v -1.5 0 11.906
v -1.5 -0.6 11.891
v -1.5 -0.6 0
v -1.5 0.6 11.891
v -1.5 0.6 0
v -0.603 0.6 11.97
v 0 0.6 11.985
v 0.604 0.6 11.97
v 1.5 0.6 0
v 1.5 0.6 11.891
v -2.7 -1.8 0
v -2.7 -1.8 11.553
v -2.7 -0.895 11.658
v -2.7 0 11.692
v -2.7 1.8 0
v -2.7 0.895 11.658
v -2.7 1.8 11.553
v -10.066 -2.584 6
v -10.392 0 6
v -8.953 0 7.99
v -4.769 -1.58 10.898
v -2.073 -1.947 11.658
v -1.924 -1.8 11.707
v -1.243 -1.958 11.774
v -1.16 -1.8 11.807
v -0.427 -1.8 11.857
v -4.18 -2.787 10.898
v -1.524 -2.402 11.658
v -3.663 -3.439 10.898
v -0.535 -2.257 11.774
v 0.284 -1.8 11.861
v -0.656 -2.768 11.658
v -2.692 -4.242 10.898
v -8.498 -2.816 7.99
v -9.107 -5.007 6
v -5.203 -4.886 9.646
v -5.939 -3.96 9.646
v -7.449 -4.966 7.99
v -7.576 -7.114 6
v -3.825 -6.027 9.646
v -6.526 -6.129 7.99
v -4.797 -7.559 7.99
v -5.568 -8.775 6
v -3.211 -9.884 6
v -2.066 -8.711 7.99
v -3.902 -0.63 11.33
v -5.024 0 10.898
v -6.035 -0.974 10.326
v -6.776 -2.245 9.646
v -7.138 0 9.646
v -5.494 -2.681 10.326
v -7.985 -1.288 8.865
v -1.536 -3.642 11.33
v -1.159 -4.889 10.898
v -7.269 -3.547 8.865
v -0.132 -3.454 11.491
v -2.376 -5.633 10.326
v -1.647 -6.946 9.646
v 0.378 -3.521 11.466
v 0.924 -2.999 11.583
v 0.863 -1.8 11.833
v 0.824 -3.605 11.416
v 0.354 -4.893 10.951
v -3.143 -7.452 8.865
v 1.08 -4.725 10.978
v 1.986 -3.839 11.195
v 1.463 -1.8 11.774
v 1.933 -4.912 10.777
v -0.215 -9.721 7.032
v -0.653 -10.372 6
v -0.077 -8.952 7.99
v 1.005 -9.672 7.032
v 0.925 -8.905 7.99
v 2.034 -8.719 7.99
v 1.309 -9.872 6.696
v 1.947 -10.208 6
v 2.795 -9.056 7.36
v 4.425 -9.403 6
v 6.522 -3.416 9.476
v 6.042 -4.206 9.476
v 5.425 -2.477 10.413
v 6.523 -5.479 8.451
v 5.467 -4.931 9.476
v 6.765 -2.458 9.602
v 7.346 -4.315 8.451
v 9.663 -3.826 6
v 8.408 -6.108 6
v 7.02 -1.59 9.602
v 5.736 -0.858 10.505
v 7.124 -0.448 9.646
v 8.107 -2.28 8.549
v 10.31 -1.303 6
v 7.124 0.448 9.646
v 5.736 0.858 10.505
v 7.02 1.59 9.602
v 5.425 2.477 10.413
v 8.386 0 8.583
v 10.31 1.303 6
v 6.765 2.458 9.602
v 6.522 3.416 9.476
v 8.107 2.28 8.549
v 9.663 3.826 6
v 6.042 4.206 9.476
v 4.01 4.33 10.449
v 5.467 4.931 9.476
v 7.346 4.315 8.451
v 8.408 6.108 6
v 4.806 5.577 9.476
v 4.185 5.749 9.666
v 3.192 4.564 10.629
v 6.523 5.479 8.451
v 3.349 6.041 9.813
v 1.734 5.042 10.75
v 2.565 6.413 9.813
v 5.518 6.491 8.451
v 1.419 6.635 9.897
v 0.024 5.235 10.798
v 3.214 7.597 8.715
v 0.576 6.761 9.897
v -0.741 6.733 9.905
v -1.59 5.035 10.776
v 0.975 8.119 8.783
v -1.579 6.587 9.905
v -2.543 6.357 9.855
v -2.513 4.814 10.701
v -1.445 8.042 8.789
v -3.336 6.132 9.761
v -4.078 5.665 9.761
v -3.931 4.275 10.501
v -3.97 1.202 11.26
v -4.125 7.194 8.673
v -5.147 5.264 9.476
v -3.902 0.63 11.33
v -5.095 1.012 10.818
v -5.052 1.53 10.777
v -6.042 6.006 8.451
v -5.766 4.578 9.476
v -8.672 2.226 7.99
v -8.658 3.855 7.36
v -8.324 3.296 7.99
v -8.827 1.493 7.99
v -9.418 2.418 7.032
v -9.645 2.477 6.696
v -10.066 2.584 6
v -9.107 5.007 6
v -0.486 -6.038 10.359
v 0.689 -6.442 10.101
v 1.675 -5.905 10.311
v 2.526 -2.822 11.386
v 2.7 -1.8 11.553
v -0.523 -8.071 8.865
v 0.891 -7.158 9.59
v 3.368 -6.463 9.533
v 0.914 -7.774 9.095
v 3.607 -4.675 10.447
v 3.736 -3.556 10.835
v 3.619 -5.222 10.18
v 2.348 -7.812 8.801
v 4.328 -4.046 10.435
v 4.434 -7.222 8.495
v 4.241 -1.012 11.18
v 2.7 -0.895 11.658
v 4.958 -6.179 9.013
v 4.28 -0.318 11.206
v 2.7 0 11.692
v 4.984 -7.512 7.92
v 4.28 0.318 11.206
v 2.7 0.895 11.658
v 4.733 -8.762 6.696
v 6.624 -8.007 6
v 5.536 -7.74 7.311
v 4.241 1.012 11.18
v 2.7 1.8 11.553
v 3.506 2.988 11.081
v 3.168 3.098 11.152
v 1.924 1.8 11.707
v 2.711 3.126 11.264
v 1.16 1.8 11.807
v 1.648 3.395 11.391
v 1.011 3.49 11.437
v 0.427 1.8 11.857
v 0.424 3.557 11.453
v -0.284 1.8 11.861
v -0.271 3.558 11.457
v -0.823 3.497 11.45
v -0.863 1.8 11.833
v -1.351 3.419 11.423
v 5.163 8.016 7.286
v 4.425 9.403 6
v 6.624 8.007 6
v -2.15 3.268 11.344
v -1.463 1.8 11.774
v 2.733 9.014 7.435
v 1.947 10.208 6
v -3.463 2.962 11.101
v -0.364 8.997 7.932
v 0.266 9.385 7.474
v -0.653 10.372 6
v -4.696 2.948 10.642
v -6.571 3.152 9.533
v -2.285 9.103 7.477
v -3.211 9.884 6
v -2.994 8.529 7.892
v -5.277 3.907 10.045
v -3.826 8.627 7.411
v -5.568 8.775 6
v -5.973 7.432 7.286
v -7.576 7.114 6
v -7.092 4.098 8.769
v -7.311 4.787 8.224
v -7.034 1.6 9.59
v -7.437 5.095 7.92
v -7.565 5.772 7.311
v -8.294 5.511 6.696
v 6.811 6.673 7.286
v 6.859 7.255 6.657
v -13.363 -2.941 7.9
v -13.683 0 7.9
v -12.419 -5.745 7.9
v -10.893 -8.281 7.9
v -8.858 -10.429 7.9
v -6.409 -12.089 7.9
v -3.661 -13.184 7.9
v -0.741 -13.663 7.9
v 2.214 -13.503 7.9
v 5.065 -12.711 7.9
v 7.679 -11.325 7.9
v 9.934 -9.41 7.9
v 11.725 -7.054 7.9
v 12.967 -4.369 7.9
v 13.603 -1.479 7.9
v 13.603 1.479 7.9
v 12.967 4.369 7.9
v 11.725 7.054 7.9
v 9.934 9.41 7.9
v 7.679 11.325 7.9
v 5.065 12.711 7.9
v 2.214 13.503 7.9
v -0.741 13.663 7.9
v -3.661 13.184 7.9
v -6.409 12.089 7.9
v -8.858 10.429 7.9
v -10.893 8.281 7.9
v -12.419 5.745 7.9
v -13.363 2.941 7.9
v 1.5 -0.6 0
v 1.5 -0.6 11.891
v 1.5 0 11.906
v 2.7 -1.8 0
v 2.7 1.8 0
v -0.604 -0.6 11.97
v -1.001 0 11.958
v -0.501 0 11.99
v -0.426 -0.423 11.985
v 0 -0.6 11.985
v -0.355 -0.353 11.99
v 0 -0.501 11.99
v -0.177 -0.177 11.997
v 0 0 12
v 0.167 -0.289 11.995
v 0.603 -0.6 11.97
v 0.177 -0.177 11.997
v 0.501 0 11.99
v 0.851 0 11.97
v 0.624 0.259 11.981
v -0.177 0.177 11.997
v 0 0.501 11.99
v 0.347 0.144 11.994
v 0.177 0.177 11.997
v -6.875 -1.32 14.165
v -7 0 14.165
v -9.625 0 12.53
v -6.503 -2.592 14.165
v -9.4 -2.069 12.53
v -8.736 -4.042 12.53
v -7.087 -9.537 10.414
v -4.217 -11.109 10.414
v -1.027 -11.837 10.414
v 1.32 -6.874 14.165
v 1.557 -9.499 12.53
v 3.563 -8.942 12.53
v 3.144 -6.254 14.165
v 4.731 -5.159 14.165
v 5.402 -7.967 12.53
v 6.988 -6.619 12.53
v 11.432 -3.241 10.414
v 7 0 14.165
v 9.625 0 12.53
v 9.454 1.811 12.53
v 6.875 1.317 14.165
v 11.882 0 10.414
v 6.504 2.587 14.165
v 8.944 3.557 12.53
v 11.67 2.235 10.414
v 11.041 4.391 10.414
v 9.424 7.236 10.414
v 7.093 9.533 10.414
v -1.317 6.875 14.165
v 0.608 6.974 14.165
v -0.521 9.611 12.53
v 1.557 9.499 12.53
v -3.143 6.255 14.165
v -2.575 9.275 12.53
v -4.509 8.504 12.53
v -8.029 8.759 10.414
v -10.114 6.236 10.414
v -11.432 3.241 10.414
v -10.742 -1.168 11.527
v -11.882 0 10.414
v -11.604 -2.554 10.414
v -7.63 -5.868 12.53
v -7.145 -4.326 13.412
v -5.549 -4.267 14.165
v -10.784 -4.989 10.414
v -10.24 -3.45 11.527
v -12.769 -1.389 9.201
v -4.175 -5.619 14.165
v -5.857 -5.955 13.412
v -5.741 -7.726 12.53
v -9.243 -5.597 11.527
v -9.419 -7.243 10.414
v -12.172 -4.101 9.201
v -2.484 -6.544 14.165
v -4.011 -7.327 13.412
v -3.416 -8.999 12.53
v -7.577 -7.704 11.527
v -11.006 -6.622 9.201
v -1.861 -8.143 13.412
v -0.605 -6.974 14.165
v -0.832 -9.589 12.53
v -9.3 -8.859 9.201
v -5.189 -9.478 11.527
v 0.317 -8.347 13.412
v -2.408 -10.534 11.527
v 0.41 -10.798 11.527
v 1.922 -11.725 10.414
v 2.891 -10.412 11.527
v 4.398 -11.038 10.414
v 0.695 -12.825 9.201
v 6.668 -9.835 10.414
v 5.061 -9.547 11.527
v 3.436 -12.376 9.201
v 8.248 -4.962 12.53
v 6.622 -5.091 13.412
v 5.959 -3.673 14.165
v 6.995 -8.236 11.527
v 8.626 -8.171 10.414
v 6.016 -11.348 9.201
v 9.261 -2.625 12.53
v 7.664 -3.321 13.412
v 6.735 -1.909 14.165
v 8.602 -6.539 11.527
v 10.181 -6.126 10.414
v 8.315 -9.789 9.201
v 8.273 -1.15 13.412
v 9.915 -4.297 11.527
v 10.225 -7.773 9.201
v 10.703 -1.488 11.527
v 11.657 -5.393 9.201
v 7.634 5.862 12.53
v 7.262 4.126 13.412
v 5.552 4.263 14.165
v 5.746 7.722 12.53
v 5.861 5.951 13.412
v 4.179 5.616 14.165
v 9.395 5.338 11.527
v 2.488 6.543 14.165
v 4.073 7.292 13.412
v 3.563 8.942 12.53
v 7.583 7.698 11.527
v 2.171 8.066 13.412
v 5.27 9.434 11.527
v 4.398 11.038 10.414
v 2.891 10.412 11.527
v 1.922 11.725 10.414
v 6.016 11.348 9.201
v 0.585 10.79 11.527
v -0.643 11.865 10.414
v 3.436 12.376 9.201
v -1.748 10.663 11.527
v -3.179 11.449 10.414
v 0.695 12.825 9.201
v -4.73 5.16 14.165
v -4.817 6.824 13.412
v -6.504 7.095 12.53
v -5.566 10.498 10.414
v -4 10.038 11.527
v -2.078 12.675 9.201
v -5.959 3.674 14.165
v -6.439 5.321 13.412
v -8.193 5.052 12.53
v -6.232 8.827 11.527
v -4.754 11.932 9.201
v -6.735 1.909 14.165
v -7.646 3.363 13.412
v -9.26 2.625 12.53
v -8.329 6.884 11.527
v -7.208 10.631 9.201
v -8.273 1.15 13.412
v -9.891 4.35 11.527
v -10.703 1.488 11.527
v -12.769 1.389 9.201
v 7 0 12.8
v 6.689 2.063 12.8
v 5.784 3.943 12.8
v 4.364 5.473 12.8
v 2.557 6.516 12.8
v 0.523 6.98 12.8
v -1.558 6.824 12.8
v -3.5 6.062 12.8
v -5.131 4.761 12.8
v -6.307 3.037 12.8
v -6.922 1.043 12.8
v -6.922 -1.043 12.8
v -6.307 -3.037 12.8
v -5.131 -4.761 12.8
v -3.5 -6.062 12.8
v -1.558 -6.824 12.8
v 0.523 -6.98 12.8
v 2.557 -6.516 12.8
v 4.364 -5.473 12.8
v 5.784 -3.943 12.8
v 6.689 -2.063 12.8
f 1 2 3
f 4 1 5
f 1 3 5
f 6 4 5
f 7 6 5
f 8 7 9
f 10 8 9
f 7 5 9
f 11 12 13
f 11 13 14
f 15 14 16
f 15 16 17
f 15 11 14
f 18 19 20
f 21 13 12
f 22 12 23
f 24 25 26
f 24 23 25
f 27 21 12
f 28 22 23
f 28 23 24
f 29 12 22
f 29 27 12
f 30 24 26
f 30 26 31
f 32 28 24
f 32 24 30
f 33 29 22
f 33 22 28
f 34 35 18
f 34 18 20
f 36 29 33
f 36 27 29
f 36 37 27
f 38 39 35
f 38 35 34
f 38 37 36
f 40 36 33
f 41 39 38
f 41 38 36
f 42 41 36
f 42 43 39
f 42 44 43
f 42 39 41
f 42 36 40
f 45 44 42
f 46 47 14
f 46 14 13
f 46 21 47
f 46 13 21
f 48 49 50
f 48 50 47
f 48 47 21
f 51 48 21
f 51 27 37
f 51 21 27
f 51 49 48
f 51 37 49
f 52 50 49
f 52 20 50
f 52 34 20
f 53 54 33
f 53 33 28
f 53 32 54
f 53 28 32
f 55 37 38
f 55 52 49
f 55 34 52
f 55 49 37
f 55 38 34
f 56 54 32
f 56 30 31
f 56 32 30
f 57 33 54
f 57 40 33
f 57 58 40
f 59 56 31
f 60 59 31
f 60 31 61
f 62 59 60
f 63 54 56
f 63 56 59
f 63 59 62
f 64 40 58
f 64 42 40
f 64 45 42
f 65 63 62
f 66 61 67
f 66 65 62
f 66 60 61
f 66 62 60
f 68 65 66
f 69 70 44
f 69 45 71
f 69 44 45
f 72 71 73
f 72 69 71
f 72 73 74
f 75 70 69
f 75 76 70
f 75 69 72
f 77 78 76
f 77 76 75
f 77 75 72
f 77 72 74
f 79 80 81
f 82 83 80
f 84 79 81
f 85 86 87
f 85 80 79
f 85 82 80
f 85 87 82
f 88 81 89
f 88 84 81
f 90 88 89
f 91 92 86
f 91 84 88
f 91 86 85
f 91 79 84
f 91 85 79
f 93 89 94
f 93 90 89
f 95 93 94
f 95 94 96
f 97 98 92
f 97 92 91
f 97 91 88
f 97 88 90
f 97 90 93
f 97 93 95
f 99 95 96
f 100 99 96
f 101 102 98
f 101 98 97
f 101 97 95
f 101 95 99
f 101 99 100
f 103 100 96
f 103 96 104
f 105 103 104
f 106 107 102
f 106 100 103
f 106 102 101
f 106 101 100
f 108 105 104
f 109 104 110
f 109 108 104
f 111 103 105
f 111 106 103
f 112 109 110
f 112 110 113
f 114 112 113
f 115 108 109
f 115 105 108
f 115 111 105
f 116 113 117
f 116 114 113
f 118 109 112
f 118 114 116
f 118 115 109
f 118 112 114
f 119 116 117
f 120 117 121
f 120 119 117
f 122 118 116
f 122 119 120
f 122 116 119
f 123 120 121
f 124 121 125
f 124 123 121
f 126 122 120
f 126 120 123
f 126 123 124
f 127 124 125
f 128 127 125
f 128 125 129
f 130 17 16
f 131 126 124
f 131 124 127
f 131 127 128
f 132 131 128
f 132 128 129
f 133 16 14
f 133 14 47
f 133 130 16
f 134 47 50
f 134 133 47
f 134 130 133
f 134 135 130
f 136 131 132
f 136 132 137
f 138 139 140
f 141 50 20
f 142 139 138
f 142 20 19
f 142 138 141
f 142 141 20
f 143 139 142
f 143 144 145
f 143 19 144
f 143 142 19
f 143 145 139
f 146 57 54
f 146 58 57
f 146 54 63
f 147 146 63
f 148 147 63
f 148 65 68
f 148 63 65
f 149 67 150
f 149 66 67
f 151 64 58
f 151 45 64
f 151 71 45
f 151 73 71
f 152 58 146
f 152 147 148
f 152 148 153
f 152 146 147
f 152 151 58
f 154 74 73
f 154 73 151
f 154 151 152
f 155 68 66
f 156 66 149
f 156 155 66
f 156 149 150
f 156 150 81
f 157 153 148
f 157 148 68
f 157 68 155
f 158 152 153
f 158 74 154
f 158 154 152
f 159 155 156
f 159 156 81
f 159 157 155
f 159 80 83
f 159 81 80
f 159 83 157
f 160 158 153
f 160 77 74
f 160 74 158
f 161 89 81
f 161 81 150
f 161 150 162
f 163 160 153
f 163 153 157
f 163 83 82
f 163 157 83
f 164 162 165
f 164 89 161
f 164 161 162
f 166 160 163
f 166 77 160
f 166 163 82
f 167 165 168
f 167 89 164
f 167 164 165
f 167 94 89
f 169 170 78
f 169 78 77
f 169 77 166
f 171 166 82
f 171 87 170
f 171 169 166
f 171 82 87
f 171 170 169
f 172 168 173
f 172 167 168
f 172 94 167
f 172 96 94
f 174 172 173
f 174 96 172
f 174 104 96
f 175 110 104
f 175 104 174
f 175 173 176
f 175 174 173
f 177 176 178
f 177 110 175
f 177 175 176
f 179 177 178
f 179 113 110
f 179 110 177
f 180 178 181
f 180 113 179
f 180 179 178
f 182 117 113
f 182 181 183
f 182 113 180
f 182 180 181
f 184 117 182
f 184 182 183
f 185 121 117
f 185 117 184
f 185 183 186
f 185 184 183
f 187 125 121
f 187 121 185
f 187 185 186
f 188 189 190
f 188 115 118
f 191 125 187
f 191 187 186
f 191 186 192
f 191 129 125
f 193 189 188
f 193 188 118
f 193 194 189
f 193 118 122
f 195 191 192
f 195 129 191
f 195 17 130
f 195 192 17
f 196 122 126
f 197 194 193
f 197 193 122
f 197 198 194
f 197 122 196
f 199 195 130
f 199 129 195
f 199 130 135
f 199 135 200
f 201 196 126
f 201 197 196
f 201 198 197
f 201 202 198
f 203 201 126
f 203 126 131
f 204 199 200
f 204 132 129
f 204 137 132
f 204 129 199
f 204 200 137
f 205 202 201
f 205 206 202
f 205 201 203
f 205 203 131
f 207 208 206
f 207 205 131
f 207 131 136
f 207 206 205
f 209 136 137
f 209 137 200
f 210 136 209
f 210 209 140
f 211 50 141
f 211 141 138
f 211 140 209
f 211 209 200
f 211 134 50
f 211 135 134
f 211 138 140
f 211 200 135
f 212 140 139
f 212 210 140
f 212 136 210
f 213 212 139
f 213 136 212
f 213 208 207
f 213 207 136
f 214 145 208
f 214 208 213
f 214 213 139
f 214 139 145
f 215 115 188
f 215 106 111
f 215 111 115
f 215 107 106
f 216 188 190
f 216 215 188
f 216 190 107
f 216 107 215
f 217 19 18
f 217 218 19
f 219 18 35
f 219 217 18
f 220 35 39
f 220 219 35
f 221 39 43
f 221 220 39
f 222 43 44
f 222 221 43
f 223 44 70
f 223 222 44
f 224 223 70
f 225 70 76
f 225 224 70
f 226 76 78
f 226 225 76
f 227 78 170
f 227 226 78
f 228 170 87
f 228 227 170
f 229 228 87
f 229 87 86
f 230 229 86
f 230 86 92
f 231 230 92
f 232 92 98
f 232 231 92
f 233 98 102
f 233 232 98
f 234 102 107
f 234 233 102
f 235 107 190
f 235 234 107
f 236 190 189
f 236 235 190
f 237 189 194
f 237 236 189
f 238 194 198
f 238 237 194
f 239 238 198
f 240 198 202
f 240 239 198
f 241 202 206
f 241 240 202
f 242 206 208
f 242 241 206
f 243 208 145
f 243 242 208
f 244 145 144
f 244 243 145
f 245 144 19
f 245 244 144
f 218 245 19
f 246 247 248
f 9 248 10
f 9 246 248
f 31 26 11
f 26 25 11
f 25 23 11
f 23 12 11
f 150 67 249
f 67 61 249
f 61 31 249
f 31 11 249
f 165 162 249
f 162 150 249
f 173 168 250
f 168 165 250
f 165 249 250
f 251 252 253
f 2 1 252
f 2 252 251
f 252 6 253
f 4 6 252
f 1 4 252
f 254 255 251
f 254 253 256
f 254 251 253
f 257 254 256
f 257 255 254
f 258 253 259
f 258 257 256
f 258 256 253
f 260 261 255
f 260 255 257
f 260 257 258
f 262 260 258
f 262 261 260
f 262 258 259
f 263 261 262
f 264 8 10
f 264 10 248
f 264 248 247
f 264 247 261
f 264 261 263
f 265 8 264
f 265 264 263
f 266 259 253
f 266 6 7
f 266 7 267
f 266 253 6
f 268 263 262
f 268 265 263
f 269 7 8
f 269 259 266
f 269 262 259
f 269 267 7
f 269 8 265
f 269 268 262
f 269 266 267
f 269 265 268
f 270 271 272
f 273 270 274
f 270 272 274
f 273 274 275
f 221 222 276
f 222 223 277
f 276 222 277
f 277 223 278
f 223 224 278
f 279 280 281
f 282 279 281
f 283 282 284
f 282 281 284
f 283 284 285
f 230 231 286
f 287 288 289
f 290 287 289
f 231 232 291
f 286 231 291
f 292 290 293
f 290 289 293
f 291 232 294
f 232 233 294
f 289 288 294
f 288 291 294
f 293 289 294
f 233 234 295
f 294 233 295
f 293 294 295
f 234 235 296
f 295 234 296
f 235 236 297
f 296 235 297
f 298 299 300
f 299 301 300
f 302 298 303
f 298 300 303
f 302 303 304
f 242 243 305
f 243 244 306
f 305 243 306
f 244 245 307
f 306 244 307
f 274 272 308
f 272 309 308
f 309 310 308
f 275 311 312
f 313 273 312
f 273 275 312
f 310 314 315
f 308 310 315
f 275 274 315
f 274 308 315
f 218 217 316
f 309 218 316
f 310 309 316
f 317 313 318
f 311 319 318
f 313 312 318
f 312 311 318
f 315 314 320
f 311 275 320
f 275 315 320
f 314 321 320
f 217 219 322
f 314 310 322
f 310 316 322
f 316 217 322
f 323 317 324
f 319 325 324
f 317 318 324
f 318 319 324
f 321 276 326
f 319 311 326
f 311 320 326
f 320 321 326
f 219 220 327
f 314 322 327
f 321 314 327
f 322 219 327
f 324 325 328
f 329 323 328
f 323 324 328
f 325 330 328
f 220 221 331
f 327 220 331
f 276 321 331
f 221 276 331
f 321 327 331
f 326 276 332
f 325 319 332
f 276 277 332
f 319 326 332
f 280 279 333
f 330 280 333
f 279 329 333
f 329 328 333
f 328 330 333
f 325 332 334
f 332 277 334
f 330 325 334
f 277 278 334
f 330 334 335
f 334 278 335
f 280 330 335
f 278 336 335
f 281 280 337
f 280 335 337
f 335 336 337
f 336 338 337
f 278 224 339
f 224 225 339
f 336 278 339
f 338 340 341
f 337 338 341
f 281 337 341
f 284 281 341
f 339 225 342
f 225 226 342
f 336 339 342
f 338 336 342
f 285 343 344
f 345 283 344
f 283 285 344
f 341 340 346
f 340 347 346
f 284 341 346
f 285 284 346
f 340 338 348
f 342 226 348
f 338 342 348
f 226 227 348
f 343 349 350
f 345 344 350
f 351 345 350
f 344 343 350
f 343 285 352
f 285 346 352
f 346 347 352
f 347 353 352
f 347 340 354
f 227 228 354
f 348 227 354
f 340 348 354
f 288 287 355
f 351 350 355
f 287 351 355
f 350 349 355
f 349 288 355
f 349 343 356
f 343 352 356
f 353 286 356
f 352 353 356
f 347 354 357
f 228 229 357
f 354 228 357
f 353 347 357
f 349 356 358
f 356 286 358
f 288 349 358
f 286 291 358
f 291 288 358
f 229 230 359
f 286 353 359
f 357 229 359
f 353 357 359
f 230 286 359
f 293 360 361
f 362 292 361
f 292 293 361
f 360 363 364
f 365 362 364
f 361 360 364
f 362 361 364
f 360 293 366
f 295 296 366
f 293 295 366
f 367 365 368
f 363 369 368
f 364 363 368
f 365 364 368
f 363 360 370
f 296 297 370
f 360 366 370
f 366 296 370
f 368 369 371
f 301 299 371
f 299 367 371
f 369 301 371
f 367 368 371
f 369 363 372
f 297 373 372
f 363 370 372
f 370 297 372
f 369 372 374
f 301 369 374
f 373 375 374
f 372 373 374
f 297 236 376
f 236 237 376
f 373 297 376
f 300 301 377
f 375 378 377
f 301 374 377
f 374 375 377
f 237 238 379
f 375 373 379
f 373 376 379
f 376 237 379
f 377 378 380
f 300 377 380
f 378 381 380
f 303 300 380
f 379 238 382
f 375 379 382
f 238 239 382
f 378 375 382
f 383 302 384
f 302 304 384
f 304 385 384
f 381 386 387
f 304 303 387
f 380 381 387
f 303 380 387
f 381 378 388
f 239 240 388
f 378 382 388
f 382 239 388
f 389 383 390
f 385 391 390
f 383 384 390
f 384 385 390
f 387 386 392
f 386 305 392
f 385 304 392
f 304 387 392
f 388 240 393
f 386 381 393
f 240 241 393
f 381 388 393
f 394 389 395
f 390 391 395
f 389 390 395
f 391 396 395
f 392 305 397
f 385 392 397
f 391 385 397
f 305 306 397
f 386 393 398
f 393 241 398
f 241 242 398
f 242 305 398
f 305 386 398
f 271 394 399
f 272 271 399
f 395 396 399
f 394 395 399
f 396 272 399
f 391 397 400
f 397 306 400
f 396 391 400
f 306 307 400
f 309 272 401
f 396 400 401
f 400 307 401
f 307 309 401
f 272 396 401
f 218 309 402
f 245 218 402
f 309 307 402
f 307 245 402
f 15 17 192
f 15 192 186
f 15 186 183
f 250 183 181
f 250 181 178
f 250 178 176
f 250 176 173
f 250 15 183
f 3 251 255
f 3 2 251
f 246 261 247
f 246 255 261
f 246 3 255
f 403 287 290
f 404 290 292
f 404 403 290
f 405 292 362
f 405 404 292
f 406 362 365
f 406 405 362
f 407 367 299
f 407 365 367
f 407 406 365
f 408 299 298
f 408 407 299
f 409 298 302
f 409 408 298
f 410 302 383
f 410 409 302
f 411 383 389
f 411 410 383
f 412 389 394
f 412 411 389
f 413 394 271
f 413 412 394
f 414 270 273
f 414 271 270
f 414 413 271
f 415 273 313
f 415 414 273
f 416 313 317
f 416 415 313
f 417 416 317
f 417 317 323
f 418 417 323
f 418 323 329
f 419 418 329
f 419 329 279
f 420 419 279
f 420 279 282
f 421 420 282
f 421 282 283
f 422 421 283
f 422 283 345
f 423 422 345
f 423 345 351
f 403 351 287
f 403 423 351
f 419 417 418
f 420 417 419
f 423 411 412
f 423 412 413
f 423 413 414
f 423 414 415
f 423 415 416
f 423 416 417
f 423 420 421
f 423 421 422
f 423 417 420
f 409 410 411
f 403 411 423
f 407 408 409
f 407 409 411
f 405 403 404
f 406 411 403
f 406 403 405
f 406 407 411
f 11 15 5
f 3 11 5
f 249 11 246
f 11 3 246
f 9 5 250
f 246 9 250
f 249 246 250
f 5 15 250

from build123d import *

# Parameters (mm, degrees)
CYLINDER_R     = 7
CYLINDER_DEPTH = 5
SKETCH_W       = 5.4
SKETCH_H       = 3.6
SKETCH_W_2     = 3
SKETCH_H_2     = 1.2
PAD_DEPTH      = 15.5


with BuildPart() as cylinder:
    # Cylinder → Cylinder (new body)
    with BuildSketch(Plane.XY.offset(12.8)):
        Circle(CYLINDER_R)
    extrude(amount=CYLINDER_DEPTH)


with BuildPart() as body001:
    # Sketch001 → Revolution (revolve)
    with BuildSketch(Plane.XZ):
        with BuildLine():
            ThreePointArc((0, 15.8), (-7.9, 13.683201), (-13.683201, 7.9))
            Line((-10.392305, 6), (-13.683201, 7.9))
            ThreePointArc((0, 12), (-6, 10.392305), (-10.392305, 6))
            Line((0, 15.8), (0, 12))
        make_face()
    revolve(axis=Axis((0, 0, 0), (0, 0, 1)))


with BuildPart() as cut:
    # Sketch → Pad (new body)
    with BuildSketch(Plane.XY):
        Rectangle(SKETCH_W, SKETCH_H)
        Rectangle(SKETCH_W_2, SKETCH_H_2, mode=Mode.SUBTRACT)
    extrude(amount=PAD_DEPTH)

    # Boolean: union Body001
    add(body001.part)

    # Cut: cut Cylinder
    add(cylinder.part, mode=Mode.SUBTRACT)


solid = cut.part
